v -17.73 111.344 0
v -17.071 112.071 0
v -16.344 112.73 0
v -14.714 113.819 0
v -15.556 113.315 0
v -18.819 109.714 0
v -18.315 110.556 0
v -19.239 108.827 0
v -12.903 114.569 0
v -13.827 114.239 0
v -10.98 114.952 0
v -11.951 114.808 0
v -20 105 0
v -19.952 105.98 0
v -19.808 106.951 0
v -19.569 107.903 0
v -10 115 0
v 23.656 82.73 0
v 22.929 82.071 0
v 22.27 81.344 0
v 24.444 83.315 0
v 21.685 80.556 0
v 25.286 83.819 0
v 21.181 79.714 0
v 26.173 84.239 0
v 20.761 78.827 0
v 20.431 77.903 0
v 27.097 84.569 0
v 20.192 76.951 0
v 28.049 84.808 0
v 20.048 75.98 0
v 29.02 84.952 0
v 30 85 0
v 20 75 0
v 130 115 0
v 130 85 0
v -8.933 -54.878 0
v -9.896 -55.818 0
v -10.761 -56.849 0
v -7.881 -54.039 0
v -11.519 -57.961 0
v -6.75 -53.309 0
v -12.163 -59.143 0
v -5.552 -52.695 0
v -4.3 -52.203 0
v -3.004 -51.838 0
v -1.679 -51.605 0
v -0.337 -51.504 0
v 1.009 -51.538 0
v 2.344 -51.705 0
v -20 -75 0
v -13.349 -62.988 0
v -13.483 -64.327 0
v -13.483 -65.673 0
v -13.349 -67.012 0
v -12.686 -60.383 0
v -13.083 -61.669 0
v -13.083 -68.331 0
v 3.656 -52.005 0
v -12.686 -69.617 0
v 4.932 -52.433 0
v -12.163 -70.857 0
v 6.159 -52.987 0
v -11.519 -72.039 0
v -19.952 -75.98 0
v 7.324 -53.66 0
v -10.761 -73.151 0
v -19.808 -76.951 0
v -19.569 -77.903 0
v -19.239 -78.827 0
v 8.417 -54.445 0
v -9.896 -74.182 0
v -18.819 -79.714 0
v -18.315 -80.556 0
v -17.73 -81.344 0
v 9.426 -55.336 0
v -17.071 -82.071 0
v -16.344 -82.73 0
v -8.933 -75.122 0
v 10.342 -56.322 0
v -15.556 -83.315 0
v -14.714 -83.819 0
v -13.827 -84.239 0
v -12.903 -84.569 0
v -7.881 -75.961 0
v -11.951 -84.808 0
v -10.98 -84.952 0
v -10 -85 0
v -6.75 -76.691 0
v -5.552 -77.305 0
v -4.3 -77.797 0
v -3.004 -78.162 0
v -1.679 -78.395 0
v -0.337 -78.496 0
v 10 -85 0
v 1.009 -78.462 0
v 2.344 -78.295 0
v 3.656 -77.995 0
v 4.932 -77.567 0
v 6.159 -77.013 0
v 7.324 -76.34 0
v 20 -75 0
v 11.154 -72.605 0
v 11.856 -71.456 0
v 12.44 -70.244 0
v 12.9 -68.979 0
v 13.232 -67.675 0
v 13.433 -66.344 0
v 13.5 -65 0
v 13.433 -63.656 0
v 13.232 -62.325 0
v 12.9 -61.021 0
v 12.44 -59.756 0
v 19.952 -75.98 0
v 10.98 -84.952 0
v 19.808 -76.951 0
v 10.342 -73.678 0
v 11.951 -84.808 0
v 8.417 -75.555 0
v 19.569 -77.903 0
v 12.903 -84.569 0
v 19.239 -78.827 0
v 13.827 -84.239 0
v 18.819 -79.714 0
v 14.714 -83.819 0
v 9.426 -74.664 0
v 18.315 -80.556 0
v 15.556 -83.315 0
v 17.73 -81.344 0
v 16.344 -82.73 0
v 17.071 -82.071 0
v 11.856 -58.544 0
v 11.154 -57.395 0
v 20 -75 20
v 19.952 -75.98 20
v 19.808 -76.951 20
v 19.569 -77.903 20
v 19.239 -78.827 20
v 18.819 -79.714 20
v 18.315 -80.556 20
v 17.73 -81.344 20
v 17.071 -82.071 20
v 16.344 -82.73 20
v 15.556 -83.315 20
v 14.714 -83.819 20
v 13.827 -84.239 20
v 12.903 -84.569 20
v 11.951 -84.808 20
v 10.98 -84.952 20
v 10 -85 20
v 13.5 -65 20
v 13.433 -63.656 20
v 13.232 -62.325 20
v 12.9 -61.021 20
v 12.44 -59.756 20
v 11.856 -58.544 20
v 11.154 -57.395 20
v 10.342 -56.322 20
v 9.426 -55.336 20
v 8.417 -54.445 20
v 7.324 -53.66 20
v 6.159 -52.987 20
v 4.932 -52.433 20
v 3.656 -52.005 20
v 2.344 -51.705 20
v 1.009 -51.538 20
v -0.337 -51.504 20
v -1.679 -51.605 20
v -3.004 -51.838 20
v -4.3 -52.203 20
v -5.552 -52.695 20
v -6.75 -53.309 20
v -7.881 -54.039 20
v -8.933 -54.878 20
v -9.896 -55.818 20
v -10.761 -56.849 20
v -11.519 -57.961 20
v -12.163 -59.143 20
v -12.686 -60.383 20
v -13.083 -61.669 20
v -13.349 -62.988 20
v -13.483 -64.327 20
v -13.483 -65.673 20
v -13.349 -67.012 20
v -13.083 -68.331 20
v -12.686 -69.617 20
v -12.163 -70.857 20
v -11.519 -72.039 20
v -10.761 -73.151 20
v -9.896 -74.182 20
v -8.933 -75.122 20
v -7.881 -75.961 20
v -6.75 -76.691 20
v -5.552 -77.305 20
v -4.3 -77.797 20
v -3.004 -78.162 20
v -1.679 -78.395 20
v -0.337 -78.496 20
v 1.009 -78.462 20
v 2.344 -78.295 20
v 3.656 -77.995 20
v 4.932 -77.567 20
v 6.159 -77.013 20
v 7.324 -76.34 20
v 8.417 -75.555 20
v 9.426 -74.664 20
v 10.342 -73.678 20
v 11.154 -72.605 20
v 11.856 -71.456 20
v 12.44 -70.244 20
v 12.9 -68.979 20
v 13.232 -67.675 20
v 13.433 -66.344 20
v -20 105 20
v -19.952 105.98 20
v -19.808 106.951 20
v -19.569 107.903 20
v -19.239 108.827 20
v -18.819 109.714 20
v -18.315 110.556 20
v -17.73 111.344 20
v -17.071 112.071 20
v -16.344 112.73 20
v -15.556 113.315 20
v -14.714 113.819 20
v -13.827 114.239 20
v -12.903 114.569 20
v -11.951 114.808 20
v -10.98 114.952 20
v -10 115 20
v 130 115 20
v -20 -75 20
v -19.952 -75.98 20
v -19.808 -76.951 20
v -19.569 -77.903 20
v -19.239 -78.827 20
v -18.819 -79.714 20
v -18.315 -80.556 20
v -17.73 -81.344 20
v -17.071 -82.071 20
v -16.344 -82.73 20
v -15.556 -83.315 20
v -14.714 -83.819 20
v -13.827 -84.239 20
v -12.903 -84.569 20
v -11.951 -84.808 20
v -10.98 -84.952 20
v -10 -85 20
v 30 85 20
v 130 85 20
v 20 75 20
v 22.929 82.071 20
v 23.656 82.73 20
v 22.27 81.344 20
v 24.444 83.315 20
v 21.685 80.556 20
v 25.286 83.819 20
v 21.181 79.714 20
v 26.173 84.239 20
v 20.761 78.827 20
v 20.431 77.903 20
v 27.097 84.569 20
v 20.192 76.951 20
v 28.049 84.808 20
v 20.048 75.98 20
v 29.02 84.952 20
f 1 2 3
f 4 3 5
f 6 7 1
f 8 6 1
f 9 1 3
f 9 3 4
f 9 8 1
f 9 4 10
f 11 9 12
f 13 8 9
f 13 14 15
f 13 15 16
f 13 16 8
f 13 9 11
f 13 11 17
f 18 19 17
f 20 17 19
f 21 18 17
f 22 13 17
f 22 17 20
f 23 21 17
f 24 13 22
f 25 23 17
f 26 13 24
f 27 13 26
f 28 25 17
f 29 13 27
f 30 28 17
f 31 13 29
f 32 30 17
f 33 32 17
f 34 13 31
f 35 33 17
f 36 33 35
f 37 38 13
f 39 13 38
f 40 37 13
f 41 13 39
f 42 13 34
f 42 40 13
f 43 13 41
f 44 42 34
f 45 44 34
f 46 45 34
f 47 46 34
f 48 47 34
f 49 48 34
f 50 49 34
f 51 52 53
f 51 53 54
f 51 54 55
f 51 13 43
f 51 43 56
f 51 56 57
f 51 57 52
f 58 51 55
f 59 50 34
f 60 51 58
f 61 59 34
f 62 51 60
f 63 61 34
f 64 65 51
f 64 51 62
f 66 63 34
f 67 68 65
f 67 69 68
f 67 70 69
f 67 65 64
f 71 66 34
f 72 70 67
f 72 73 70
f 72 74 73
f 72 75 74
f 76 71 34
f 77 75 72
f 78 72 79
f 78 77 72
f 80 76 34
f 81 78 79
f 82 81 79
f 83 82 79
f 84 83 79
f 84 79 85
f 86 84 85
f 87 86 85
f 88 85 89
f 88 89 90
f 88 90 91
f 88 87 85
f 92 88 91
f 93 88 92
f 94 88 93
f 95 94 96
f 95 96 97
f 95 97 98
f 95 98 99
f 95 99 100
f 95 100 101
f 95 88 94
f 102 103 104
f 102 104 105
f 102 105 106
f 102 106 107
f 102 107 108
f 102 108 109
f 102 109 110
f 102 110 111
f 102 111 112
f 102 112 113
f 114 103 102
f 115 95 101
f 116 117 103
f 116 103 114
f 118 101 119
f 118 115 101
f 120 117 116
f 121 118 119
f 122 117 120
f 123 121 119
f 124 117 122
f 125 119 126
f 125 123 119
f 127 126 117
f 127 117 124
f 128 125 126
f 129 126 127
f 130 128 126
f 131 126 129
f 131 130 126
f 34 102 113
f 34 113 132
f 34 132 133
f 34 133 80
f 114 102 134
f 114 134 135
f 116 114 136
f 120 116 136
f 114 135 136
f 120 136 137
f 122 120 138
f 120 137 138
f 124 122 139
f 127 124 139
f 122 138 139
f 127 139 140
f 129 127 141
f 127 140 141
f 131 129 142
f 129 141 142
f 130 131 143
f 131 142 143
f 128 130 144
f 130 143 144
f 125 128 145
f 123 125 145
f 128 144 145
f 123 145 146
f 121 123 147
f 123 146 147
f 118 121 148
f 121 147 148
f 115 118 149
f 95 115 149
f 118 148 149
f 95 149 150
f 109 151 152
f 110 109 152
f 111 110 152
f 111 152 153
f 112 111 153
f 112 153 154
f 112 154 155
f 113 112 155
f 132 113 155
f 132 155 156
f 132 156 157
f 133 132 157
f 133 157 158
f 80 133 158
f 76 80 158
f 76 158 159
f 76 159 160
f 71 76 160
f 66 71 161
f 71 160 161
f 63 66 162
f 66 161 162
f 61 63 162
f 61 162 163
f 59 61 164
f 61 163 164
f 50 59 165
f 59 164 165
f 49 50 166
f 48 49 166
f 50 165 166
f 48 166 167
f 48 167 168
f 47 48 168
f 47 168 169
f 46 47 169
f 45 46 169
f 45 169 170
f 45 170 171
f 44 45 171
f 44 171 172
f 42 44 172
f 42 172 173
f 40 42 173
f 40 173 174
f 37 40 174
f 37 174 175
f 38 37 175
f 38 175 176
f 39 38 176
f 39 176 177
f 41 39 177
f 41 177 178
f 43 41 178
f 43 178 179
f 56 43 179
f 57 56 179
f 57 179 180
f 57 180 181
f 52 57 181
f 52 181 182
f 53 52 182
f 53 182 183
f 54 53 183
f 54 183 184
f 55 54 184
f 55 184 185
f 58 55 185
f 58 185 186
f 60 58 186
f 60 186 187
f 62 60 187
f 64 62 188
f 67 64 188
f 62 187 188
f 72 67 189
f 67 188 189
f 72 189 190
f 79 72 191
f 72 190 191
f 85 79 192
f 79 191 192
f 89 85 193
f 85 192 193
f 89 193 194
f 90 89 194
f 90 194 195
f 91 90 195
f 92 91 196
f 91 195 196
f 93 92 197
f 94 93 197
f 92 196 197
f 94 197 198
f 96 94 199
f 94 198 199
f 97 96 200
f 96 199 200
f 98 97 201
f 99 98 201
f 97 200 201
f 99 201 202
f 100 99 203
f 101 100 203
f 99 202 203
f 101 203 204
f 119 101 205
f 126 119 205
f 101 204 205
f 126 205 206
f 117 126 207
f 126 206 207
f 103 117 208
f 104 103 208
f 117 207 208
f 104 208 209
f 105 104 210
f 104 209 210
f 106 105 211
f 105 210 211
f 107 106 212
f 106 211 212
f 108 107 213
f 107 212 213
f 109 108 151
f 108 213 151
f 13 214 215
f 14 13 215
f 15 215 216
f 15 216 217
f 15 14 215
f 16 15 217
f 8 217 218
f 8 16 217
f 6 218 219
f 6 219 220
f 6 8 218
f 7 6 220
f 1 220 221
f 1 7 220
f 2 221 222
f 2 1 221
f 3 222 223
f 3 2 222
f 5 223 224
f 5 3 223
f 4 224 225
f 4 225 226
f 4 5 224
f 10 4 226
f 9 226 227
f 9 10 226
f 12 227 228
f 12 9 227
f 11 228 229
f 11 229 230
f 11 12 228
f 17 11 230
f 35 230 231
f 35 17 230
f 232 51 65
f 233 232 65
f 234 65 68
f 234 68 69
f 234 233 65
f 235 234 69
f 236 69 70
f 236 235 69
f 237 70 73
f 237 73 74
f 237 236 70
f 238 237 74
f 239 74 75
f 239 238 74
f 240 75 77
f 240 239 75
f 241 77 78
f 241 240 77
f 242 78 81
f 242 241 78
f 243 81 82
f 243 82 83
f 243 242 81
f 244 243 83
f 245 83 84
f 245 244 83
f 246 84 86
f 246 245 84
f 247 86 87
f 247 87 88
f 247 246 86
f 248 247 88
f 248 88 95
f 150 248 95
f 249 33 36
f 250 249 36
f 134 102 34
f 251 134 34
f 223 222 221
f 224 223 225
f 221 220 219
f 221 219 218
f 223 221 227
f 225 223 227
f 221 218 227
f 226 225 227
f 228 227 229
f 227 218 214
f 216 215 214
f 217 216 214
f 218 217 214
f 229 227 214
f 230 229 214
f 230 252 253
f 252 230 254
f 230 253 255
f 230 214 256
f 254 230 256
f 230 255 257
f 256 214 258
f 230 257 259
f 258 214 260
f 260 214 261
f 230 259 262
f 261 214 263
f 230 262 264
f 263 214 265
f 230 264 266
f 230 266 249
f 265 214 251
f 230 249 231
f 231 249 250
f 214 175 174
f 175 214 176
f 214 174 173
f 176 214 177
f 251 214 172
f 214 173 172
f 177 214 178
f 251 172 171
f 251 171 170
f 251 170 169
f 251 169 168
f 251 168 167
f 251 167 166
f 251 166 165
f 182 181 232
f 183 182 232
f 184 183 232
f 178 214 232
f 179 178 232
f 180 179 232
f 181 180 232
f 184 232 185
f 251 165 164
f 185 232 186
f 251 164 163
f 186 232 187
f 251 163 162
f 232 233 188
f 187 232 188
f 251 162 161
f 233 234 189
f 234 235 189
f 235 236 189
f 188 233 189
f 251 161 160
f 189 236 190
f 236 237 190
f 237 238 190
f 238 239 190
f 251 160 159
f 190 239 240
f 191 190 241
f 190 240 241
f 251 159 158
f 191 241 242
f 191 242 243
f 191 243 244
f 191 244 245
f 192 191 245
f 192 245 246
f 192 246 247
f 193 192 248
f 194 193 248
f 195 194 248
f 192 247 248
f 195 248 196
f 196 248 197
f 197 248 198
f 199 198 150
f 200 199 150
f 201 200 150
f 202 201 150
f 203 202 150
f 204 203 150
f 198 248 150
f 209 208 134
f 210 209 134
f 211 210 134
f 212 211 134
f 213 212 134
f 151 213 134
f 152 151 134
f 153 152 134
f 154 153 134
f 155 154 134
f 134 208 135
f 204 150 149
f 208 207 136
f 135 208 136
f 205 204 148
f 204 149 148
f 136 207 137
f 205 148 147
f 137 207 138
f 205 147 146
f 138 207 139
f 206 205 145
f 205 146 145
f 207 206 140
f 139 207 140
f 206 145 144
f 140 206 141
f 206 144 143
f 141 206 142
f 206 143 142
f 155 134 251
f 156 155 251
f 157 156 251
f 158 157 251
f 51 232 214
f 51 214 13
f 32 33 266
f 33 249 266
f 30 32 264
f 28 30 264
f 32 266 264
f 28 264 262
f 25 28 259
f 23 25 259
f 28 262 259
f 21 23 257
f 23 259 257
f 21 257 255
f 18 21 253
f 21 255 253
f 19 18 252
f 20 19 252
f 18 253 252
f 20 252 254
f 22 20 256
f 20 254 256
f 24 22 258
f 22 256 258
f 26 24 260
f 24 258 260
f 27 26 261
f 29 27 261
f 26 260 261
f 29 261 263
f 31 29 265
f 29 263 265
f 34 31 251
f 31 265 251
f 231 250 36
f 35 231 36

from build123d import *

# Parameters (mm, degrees)
SKETCH1_W           = 40
SKETCH1_H           = 170
BOSS_EXTRUDE1_DEPTH = 20
SKETCH2_W           = 150
SKETCH2_H           = 20
BOSS_EXTRUDE2_DEPTH = 30
FILLET1_R           = 10
CUT_EXTRUDE1_REACH  = 22
SKETCH3_R           = 13.5
FILLET2_R           = 10


with BuildPart() as part:
    # Sketch1 → Boss-Extrude1 (new body)
    with BuildSketch(Plane.XY):
        Rectangle(SKETCH1_W, SKETCH1_H)
    extrude(amount=BOSS_EXTRUDE1_DEPTH)

    # Sketch2 → Boss-Extrude2 (add)
    with BuildSketch(Plane(origin=(0, 85, 0), x_dir=(1, 0, 0), z_dir=(0, 1, 0))):
        with Locations((55, -10)):
            Rectangle(SKETCH2_W, SKETCH2_H)
    extrude(amount=BOSS_EXTRUDE2_DEPTH)

    # Fillet1
    fillet1_edges = [part.edges().sort_by_distance(p)[0] for p in [
        (20, -85, 10),
        (-20, -85, 10),
        (-20, 115, 10),
    ]]
    fillet(fillet1_edges, radius=FILLET1_R)

    # Sketch3 → Cut-Extrude1 (cut, up to next)
    with BuildSketch(Plane.XY.offset(20), mode=Mode.PRIVATE) as cut_extrude1_sk1:
        with Locations((0, -65)):
            Circle(SKETCH3_R)
    cut_extrude1_tool1 = extrude(cut_extrude1_sk1.sketch, amount=-CUT_EXTRUDE1_REACH, mode=Mode.PRIVATE) & part.part
    add(cut_extrude1_tool1.solids().sort_by_distance((0, -65, 20))[0], mode=Mode.SUBTRACT)

    # Fillet2
    fillet2_edges = [part.edges().sort_by_distance(p)[0] for p in [
        (20, 85, 10),
    ]]
    fillet(fillet2_edges, radius=FILLET2_R)


solid = part.part
